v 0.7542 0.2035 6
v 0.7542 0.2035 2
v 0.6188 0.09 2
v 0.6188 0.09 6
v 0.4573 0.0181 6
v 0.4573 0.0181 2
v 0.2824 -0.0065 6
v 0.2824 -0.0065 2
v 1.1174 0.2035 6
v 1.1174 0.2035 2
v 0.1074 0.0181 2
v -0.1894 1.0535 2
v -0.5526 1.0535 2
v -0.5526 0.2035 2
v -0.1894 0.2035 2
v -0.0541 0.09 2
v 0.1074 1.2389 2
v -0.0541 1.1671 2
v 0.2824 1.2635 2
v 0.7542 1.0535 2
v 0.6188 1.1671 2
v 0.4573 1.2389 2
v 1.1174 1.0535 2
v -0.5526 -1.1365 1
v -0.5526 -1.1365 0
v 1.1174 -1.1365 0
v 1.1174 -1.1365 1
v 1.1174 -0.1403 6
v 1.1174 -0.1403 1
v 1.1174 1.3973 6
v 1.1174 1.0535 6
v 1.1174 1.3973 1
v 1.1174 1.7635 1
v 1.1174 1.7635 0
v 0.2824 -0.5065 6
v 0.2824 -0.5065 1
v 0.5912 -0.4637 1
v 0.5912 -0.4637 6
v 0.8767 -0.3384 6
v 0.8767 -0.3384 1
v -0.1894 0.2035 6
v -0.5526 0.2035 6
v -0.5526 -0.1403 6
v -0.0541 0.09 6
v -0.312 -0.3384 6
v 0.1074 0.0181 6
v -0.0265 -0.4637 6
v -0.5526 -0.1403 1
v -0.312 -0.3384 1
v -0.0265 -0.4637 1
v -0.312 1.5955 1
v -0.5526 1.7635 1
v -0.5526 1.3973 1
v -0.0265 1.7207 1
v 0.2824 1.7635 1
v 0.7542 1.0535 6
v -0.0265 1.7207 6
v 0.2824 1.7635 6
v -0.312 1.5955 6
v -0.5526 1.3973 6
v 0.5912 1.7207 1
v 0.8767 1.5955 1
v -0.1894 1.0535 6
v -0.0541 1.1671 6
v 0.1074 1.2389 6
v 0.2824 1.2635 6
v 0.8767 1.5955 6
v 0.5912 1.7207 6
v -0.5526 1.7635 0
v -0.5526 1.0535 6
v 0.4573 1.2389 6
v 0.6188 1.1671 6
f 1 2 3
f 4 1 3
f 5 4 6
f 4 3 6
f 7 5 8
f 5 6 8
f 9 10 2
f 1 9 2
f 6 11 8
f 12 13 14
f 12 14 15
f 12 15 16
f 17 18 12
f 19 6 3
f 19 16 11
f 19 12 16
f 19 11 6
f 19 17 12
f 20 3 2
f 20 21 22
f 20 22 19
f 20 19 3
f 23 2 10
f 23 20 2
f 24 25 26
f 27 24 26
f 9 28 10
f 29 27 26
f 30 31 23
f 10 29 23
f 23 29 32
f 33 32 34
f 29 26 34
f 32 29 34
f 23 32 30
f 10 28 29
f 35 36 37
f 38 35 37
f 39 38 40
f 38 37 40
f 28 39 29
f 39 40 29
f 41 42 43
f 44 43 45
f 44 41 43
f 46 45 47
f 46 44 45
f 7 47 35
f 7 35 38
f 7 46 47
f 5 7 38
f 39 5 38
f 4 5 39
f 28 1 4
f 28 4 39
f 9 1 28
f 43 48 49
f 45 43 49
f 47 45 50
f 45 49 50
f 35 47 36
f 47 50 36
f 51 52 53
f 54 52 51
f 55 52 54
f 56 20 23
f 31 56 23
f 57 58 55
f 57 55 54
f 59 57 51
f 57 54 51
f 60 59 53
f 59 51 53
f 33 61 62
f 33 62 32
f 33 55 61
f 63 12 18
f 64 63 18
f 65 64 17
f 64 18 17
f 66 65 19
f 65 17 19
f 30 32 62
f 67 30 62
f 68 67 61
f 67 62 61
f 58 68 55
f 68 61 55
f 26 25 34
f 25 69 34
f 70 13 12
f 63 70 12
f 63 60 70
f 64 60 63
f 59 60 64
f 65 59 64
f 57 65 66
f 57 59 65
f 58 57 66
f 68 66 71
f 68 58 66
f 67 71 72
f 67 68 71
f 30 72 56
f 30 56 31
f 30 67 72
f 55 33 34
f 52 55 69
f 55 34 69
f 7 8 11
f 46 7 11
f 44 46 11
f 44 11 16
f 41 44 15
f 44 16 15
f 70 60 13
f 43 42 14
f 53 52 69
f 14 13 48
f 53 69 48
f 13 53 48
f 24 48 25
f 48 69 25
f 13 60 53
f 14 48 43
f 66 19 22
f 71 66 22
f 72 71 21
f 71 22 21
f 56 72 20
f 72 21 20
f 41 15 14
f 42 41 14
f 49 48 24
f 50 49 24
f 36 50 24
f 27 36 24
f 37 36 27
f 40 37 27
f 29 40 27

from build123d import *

# Parameters (mm, degrees)
F1_DEPTH = 1
F2_DEPTH = 2
F3_DEPTH = 6


with BuildPart() as f1:
    # F0 (on Top) → F1 (new body)
    with BuildSketch(Plane.XY):
        Polygon((0.2823591599, -0.5064888335), (-0.5526408401, -0.5064888335), (-0.5526408401, -1.1364888335), (1.1173591599, -1.1364888335), (1.1173591599, -0.5064888335), align=None)
        with BuildLine():
            ThreePointArc((0.2823591599, -0.5064888335), (-0.1735336171, -0.4109053889), (-0.5526408401, -0.1402540772))
            Line((-0.5526408401, -0.1402540772), (-0.5526408401, -0.5064888335))
            Line((-0.5526408401, -0.5064888335), (0.2823591599, -0.5064888335))
        make_face()
        with BuildLine():
            Line((1.1173591599, -0.5064888335), (1.1173591599, -0.1402540772))
            ThreePointArc((1.1173591599, -0.1402540772), (0.738251937, -0.4109053889), (0.2823591599, -0.5064888335))
            Line((0.2823591599, -0.5064888335), (1.1173591599, -0.5064888335))
        make_face()
    extrude(amount=F1_DEPTH)



with BuildPart() as f1b:
    # F0 (on Top) → F1, piece 2 (new body)
    with BuildSketch(Plane.XY):
        with BuildLine():
            Line((1.1173591599, 1.7635111665), (0.2823591599, 1.7635111665))
            ThreePointArc((0.2823591599, 1.7635111665), (0.738251937, 1.667927722), (1.1173591599, 1.3972764103))
            Line((1.1173591599, 1.3972764103), (1.1173591599, 1.7635111665))
        make_face()
    extrude(amount=F1_DEPTH)


with BuildPart() as f1c:
    # F0 (on Top) → F1, piece 3 (new body)
    with BuildSketch(Plane.XY):
        with BuildLine():
            Line((0.2823591599, 1.7635111665), (-0.5526408401, 1.7635111665))
            Line((-0.5526408401, 1.7635111665), (-0.5526408401, 1.3972764103))
            ThreePointArc((-0.5526408401, 1.3972764103), (-0.1735336171, 1.667927722), (0.2823591599, 1.7635111665))
        make_face()
    extrude(amount=F1_DEPTH)


with BuildPart() as f2:
    # F0 (on Top) → F2 (new body)
    with BuildSketch(Plane.XY):
        with BuildLine():
            Line((0.2823591599, 0.2035111665), (0.2823591599, 0.6285111665))
            Line((0.2823591599, 0.6285111665), (-0.3526408401, 0.6285111665))
            ThreePointArc((-0.3526408401, 0.6285111665), (-0.3104397956, 0.4008834038), (-0.1894458846, 0.2035111665))
            Line((-0.1894458846, 0.2035111665), (0.2823591599, 0.2035111665))
        make_face()
        with BuildLine():
            Line((-0.3526408401, 0.6285111665), (-0.5526408401, 0.6285111665))
            Line((-0.5526408401, 0.6285111665), (-0.5526408401, 0.2035111665))
            Line((-0.5526408401, 0.2035111665), (-0.1894458846, 0.2035111665))
            ThreePointArc((-0.1894458846, 0.2035111665), (-0.3104397956, 0.4008834038), (-0.3526408401, 0.6285111665))
        make_face()
        with BuildLine():
            Line((-0.1894458846, 1.0535111665), (-0.5526408401, 1.0535111665))
            Line((-0.5526408401, 1.0535111665), (-0.5526408401, 0.6285111665))
            Line((-0.5526408401, 0.6285111665), (-0.3526408401, 0.6285111665))
            ThreePointArc((-0.3526408401, 0.6285111665), (-0.3104397956, 0.8561389293), (-0.1894458846, 1.0535111665))
        make_face()
        with BuildLine():
            Line((0.2823591599, 0.6285111665), (0.2823591599, 1.0535111665))
            Line((0.2823591599, 1.0535111665), (-0.1894458846, 1.0535111665))
            ThreePointArc((-0.1894458846, 1.0535111665), (-0.3104397956, 0.8561389293), (-0.3526408401, 0.6285111665))
            Line((-0.3526408401, 0.6285111665), (0.2823591599, 0.6285111665))
        make_face()
        with BuildLine():
            Line((0.7541642044, 1.0535111665), (0.2823591599, 1.0535111665))
            Line((0.2823591599, 1.0535111665), (0.2823591599, 0.6285111665))
            Line((0.2823591599, 0.6285111665), (0.9173591599, 0.6285111665))
            ThreePointArc((0.9173591599, 0.6285111665), (0.8751581154, 0.8561389293), (0.7541642044, 1.0535111665))
        make_face()
        with BuildLine():
            Line((1.1173591599, 1.0535111665), (0.7541642044, 1.0535111665))
            ThreePointArc((0.7541642044, 1.0535111665), (0.8751581154, 0.8561389293), (0.9173591599, 0.6285111665))
            Line((0.9173591599, 0.6285111665), (1.1173591599, 0.6285111665))
            Line((1.1173591599, 0.6285111665), (1.1173591599, 1.0535111665))
        make_face()
        with BuildLine():
            Line((1.1173591599, 0.6285111665), (0.9173591599, 0.6285111665))
            ThreePointArc((0.9173591599, 0.6285111665), (0.8751581154, 0.4008834038), (0.7541642044, 0.2035111665))
            Line((0.7541642044, 0.2035111665), (1.1173591599, 0.2035111665))
            Line((1.1173591599, 0.2035111665), (1.1173591599, 0.6285111665))
        make_face()
        with BuildLine():
            Line((0.7541642044, 0.2035111665), (0.2823591599, 0.2035111665))
            Line((0.2823591599, 0.2035111665), (0.2823591599, -0.0064888335))
            ThreePointArc((0.2823591599, -0.0064888335), (0.5405741866, 0.0483818706), (0.7541642044, 0.2035111665))
        make_face()
        with BuildLine():
            Line((0.2823591599, -0.0064888335), (0.2823591599, 0.2035111665))
            Line((0.2823591599, 0.2035111665), (-0.1894458846, 0.2035111665))
            ThreePointArc((-0.1894458846, 0.2035111665), (0.0241441332, 0.0483818706), (0.2823591599, -0.0064888335))
        make_face()
        with BuildLine():
            Line((0.9173591599, 0.6285111665), (0.2823591599, 0.6285111665))
            Line((0.2823591599, 0.6285111665), (0.2823591599, 0.2035111665))
            Line((0.2823591599, 0.2035111665), (0.7541642044, 0.2035111665))
            ThreePointArc((0.7541642044, 0.2035111665), (0.8751581154, 0.4008834038), (0.9173591599, 0.6285111665))
        make_face()
        with BuildLine():
            ThreePointArc((0.7541642044, 1.0535111665), (0.5405741866, 1.2086404625), (0.2823591599, 1.2635111665))
            Line((0.2823591599, 1.2635111665), (0.2823591599, 1.0535111665))
            Line((0.2823591599, 1.0535111665), (0.7541642044, 1.0535111665))
        make_face()
        with BuildLine():
            Line((0.2823591599, 1.0535111665), (0.2823591599, 1.2635111665))
            ThreePointArc((0.2823591599, 1.2635111665), (0.0241441332, 1.2086404625), (-0.1894458846, 1.0535111665))
            Line((-0.1894458846, 1.0535111665), (0.2823591599, 1.0535111665))
        make_face()
    extrude(amount=F2_DEPTH)


with BuildPart() as f1_1:
    add(f1.part)

    add(f1b.part)  # F3 merges F1b

    add(f1c.part)  # F3 merges F1c

    add(f2.part)  # F3 merges F2
    # F0 (on Top) → F3 (join)
    with BuildSketch(Plane.XY):
        with BuildLine():
            Line((0.2823591599, 1.2635111665), (0.2823591599, 1.7635111665))
            ThreePointArc((0.2823591599, 1.7635111665), (-0.1735336171, 1.667927722), (-0.5526408401, 1.3972764103))
            Line((-0.5526408401, 1.3972764103), (-0.5526408401, 1.0535111665))
            Line((-0.5526408401, 1.0535111665), (-0.1894458846, 1.0535111665))
            ThreePointArc((-0.1894458846, 1.0535111665), (0.0241441332, 1.2086404625), (0.2823591599, 1.2635111665))
        make_face()
        with BuildLine():
            ThreePointArc((1.1173591599, 1.3972764103), (0.738251937, 1.667927722), (0.2823591599, 1.7635111665))
            Line((0.2823591599, 1.7635111665), (0.2823591599, 1.2635111665))
            ThreePointArc((0.2823591599, 1.2635111665), (0.5405741866, 1.2086404625), (0.7541642044, 1.0535111665))
            Line((0.7541642044, 1.0535111665), (1.1173591599, 1.0535111665))
            Line((1.1173591599, 1.0535111665), (1.1173591599, 1.3972764103))
        make_face()
        with BuildLine():
            Line((-0.1894458846, 0.2035111665), (-0.5526408401, 0.2035111665))
            Line((-0.5526408401, 0.2035111665), (-0.5526408401, -0.1402540772))
            ThreePointArc((-0.5526408401, -0.1402540772), (-0.1735336171, -0.4109053889), (0.2823591599, -0.5064888335))
            Line((0.2823591599, -0.5064888335), (0.2823591599, -0.0064888335))
            ThreePointArc((0.2823591599, -0.0064888335), (0.0241441332, 0.0483818706), (-0.1894458846, 0.2035111665))
        make_face()
        with BuildLine():
            Line((1.1173591599, 0.2035111665), (0.7541642044, 0.2035111665))
            ThreePointArc((0.7541642044, 0.2035111665), (0.5405741866, 0.0483818706), (0.2823591599, -0.0064888335))
            Line((0.2823591599, -0.0064888335), (0.2823591599, -0.5064888335))
            ThreePointArc((0.2823591599, -0.5064888335), (0.738251937, -0.4109053889), (1.1173591599, -0.1402540772))
            Line((1.1173591599, -0.1402540772), (1.1173591599, 0.2035111665))
        make_face()
    extrude(amount=F3_DEPTH)


solid = f1_1.part
